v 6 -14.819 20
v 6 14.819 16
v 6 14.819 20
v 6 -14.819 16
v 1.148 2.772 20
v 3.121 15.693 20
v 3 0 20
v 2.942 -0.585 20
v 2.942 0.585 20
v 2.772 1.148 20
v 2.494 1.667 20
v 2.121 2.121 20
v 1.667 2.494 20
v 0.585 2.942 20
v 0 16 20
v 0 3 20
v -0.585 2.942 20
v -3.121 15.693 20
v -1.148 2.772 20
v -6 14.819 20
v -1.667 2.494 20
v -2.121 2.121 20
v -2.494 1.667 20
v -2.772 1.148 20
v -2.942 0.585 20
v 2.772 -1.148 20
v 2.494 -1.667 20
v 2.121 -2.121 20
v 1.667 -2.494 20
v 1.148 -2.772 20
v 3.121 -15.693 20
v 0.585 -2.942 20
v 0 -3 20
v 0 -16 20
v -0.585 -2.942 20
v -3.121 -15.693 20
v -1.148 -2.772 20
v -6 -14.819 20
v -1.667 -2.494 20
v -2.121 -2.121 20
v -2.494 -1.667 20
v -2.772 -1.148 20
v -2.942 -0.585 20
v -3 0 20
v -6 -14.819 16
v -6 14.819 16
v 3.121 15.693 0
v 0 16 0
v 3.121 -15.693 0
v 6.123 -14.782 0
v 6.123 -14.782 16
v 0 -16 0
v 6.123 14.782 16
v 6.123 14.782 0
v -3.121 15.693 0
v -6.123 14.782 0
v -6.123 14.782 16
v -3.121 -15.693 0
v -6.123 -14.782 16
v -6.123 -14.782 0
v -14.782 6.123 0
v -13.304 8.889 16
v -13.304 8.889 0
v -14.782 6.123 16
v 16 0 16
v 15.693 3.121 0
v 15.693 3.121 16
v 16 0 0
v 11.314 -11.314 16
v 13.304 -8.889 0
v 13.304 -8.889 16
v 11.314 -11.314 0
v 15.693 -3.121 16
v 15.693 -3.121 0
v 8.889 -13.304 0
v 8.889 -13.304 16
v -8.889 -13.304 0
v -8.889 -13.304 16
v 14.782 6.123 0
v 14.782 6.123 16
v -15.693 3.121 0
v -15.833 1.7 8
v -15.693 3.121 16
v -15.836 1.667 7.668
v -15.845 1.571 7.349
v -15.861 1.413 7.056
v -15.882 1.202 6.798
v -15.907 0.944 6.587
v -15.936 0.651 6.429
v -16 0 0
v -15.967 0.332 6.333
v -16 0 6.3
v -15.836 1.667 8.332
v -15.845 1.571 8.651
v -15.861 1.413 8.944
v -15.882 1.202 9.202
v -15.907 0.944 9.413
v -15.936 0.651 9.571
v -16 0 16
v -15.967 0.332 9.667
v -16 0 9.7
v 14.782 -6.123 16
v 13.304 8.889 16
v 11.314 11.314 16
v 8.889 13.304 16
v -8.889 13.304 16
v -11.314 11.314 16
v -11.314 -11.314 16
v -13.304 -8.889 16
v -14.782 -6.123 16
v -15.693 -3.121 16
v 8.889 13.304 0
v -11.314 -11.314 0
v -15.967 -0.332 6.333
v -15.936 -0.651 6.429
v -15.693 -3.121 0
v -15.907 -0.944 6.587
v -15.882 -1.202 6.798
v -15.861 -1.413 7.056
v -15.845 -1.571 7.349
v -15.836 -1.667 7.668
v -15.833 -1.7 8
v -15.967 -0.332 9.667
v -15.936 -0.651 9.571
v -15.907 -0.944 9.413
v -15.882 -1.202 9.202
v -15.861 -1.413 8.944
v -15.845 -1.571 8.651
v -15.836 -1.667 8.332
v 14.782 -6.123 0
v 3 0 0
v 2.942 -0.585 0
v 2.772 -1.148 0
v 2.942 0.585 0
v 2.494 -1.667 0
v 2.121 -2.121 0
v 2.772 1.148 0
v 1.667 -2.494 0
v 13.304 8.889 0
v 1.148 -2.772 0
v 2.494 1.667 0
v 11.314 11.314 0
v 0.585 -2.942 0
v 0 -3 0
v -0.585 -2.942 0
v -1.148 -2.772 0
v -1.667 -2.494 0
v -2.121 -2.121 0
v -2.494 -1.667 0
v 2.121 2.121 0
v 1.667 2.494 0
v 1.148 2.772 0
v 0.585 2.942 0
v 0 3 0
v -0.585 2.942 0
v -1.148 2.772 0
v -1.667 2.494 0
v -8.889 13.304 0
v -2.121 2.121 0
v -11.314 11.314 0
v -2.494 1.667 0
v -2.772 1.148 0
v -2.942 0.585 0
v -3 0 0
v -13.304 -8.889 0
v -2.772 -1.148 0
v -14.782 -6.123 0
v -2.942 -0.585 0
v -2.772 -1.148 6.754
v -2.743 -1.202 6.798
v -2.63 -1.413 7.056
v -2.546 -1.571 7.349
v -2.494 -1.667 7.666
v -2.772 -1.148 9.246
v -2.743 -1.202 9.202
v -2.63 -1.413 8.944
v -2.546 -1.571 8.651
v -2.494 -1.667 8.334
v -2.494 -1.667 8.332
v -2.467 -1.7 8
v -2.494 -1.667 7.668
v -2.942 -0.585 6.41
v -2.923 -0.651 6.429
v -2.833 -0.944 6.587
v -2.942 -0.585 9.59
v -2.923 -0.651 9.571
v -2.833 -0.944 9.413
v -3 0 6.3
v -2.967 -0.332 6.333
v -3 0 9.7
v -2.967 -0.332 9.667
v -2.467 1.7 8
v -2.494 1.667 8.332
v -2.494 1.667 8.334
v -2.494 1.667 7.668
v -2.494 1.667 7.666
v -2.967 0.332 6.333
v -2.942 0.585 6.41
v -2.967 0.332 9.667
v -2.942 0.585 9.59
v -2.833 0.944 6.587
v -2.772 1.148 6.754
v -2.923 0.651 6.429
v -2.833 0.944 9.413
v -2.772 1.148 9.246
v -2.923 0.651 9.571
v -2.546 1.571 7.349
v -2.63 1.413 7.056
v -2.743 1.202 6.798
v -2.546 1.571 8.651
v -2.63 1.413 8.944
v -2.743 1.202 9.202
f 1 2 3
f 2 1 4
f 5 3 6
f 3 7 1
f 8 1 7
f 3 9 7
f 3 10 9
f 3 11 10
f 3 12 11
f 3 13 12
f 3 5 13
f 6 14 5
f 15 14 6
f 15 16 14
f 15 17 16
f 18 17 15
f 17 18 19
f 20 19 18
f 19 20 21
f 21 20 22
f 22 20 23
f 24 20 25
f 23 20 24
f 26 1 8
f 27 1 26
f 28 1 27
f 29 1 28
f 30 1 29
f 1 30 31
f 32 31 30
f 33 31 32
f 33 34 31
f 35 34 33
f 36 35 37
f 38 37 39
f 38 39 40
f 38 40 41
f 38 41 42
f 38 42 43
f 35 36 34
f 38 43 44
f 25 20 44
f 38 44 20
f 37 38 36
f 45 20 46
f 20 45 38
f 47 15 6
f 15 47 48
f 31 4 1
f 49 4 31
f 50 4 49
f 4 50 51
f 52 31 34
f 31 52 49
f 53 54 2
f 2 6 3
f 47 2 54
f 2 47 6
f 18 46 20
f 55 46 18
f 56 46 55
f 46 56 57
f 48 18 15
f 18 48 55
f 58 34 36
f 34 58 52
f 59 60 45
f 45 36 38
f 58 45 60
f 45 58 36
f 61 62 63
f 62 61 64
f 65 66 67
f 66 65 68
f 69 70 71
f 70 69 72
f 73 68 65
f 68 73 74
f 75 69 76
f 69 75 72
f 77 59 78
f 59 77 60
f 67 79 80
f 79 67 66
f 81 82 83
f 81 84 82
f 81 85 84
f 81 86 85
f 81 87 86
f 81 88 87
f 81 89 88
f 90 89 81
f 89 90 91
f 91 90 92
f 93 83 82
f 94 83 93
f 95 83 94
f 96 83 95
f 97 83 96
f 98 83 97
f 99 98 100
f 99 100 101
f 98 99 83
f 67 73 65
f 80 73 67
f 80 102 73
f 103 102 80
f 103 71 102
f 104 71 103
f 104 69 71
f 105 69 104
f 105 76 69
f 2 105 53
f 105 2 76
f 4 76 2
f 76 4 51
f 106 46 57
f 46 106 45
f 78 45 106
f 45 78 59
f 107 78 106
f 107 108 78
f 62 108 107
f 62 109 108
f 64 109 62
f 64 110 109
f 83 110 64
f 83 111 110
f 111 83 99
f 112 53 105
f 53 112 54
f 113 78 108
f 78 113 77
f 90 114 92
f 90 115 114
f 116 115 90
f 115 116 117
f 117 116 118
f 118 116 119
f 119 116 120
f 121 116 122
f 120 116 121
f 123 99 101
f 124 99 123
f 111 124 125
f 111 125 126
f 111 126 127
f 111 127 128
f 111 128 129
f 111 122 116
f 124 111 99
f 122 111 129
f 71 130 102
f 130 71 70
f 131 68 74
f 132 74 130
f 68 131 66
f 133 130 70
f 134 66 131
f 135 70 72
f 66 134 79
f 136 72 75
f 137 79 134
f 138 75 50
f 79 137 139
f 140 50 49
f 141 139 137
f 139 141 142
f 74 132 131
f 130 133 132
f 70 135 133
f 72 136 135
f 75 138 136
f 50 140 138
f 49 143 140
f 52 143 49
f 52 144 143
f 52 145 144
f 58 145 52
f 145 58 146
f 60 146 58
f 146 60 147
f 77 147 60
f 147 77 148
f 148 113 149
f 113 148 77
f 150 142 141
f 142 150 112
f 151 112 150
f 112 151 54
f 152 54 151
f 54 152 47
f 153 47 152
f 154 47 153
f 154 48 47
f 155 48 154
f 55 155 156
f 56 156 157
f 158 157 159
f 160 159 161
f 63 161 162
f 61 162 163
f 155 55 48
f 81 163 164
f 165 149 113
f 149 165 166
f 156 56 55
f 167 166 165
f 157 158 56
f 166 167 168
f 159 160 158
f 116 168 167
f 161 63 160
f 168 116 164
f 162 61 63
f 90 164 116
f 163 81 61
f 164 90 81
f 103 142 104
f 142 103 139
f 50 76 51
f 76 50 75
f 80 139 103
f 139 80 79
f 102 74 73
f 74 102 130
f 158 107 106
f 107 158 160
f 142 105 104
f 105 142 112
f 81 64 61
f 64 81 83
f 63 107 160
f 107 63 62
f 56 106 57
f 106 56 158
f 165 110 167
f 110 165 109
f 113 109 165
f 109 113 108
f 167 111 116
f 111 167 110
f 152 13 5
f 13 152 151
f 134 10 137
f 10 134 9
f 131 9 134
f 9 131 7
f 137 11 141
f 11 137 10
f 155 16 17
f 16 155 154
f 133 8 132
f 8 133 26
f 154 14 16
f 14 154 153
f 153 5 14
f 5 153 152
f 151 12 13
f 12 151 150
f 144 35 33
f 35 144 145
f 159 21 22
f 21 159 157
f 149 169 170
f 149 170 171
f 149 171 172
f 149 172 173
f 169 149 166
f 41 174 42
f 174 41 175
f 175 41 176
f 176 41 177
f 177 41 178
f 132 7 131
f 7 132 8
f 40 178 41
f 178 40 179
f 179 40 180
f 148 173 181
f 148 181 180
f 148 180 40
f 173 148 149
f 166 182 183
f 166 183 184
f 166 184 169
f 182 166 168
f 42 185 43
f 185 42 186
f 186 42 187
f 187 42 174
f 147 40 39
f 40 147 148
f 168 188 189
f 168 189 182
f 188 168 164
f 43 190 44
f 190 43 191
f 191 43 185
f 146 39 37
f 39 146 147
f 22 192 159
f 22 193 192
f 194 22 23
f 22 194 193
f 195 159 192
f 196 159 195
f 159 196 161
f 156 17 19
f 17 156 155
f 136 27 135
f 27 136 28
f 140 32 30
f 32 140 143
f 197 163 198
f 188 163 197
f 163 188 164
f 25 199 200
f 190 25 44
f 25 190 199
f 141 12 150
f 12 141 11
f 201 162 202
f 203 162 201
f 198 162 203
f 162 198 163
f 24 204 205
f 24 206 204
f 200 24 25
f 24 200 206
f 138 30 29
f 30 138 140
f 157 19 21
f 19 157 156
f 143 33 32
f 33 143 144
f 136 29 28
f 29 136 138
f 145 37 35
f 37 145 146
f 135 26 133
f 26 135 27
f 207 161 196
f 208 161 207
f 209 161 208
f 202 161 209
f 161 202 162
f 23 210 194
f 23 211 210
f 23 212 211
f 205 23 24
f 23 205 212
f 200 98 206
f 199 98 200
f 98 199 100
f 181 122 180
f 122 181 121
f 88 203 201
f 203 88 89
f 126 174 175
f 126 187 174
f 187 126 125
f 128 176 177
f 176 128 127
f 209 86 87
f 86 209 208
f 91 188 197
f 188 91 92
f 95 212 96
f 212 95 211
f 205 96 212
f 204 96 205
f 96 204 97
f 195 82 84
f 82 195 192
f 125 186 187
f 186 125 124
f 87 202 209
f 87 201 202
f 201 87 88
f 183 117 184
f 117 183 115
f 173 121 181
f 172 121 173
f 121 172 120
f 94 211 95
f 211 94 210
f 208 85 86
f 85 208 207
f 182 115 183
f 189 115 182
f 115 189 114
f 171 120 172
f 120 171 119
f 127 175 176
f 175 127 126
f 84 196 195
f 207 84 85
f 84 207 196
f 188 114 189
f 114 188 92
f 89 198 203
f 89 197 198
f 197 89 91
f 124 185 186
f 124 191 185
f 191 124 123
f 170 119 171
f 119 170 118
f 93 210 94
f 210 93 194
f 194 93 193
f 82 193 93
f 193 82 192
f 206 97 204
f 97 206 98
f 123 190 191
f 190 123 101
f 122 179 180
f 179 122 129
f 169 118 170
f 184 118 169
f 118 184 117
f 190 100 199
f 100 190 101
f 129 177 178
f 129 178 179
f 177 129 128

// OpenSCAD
$fn = 32;

// ----------------------------------------------------------------------
// Oldham coupling hub: 32 x 20 mm
// ----------------------------------------------------------------------

// --- parameters (mm) ---
flange_dia = 32;          // hub diameter
flange_len = 16;          // hub length
hub_bore = 6;             // shaft bore
key_w = 12;               // drive tongue width
tongue_h = 4;             // drive tongue height
set_d = 3.4;              // set screw tap hole

module hub() {
  cylinder(h = flange_len, d = flange_dia);
  /* tongue, clipped to the hub disc and sunk 1 mm into the face */
  intersection() {
    translate([-key_w / 2, -flange_dia / 2, flange_len - 1])
      cube([key_w, flange_dia, tongue_h + 1]);
    translate([0, 0, flange_len - 1]) cylinder(h = tongue_h + 1, d = flange_dia);
  }
}

difference() {
  hub();
  translate([0, 0, -1]) cylinder(h = flange_len + tongue_h + 2, d = hub_bore);
  translate([-flange_dia / 2 - 1, 0, flange_len * 0.5])
    rotate([0, 90, 0]) cylinder(h = flange_dia / 2 + 2, d = set_d);
}
